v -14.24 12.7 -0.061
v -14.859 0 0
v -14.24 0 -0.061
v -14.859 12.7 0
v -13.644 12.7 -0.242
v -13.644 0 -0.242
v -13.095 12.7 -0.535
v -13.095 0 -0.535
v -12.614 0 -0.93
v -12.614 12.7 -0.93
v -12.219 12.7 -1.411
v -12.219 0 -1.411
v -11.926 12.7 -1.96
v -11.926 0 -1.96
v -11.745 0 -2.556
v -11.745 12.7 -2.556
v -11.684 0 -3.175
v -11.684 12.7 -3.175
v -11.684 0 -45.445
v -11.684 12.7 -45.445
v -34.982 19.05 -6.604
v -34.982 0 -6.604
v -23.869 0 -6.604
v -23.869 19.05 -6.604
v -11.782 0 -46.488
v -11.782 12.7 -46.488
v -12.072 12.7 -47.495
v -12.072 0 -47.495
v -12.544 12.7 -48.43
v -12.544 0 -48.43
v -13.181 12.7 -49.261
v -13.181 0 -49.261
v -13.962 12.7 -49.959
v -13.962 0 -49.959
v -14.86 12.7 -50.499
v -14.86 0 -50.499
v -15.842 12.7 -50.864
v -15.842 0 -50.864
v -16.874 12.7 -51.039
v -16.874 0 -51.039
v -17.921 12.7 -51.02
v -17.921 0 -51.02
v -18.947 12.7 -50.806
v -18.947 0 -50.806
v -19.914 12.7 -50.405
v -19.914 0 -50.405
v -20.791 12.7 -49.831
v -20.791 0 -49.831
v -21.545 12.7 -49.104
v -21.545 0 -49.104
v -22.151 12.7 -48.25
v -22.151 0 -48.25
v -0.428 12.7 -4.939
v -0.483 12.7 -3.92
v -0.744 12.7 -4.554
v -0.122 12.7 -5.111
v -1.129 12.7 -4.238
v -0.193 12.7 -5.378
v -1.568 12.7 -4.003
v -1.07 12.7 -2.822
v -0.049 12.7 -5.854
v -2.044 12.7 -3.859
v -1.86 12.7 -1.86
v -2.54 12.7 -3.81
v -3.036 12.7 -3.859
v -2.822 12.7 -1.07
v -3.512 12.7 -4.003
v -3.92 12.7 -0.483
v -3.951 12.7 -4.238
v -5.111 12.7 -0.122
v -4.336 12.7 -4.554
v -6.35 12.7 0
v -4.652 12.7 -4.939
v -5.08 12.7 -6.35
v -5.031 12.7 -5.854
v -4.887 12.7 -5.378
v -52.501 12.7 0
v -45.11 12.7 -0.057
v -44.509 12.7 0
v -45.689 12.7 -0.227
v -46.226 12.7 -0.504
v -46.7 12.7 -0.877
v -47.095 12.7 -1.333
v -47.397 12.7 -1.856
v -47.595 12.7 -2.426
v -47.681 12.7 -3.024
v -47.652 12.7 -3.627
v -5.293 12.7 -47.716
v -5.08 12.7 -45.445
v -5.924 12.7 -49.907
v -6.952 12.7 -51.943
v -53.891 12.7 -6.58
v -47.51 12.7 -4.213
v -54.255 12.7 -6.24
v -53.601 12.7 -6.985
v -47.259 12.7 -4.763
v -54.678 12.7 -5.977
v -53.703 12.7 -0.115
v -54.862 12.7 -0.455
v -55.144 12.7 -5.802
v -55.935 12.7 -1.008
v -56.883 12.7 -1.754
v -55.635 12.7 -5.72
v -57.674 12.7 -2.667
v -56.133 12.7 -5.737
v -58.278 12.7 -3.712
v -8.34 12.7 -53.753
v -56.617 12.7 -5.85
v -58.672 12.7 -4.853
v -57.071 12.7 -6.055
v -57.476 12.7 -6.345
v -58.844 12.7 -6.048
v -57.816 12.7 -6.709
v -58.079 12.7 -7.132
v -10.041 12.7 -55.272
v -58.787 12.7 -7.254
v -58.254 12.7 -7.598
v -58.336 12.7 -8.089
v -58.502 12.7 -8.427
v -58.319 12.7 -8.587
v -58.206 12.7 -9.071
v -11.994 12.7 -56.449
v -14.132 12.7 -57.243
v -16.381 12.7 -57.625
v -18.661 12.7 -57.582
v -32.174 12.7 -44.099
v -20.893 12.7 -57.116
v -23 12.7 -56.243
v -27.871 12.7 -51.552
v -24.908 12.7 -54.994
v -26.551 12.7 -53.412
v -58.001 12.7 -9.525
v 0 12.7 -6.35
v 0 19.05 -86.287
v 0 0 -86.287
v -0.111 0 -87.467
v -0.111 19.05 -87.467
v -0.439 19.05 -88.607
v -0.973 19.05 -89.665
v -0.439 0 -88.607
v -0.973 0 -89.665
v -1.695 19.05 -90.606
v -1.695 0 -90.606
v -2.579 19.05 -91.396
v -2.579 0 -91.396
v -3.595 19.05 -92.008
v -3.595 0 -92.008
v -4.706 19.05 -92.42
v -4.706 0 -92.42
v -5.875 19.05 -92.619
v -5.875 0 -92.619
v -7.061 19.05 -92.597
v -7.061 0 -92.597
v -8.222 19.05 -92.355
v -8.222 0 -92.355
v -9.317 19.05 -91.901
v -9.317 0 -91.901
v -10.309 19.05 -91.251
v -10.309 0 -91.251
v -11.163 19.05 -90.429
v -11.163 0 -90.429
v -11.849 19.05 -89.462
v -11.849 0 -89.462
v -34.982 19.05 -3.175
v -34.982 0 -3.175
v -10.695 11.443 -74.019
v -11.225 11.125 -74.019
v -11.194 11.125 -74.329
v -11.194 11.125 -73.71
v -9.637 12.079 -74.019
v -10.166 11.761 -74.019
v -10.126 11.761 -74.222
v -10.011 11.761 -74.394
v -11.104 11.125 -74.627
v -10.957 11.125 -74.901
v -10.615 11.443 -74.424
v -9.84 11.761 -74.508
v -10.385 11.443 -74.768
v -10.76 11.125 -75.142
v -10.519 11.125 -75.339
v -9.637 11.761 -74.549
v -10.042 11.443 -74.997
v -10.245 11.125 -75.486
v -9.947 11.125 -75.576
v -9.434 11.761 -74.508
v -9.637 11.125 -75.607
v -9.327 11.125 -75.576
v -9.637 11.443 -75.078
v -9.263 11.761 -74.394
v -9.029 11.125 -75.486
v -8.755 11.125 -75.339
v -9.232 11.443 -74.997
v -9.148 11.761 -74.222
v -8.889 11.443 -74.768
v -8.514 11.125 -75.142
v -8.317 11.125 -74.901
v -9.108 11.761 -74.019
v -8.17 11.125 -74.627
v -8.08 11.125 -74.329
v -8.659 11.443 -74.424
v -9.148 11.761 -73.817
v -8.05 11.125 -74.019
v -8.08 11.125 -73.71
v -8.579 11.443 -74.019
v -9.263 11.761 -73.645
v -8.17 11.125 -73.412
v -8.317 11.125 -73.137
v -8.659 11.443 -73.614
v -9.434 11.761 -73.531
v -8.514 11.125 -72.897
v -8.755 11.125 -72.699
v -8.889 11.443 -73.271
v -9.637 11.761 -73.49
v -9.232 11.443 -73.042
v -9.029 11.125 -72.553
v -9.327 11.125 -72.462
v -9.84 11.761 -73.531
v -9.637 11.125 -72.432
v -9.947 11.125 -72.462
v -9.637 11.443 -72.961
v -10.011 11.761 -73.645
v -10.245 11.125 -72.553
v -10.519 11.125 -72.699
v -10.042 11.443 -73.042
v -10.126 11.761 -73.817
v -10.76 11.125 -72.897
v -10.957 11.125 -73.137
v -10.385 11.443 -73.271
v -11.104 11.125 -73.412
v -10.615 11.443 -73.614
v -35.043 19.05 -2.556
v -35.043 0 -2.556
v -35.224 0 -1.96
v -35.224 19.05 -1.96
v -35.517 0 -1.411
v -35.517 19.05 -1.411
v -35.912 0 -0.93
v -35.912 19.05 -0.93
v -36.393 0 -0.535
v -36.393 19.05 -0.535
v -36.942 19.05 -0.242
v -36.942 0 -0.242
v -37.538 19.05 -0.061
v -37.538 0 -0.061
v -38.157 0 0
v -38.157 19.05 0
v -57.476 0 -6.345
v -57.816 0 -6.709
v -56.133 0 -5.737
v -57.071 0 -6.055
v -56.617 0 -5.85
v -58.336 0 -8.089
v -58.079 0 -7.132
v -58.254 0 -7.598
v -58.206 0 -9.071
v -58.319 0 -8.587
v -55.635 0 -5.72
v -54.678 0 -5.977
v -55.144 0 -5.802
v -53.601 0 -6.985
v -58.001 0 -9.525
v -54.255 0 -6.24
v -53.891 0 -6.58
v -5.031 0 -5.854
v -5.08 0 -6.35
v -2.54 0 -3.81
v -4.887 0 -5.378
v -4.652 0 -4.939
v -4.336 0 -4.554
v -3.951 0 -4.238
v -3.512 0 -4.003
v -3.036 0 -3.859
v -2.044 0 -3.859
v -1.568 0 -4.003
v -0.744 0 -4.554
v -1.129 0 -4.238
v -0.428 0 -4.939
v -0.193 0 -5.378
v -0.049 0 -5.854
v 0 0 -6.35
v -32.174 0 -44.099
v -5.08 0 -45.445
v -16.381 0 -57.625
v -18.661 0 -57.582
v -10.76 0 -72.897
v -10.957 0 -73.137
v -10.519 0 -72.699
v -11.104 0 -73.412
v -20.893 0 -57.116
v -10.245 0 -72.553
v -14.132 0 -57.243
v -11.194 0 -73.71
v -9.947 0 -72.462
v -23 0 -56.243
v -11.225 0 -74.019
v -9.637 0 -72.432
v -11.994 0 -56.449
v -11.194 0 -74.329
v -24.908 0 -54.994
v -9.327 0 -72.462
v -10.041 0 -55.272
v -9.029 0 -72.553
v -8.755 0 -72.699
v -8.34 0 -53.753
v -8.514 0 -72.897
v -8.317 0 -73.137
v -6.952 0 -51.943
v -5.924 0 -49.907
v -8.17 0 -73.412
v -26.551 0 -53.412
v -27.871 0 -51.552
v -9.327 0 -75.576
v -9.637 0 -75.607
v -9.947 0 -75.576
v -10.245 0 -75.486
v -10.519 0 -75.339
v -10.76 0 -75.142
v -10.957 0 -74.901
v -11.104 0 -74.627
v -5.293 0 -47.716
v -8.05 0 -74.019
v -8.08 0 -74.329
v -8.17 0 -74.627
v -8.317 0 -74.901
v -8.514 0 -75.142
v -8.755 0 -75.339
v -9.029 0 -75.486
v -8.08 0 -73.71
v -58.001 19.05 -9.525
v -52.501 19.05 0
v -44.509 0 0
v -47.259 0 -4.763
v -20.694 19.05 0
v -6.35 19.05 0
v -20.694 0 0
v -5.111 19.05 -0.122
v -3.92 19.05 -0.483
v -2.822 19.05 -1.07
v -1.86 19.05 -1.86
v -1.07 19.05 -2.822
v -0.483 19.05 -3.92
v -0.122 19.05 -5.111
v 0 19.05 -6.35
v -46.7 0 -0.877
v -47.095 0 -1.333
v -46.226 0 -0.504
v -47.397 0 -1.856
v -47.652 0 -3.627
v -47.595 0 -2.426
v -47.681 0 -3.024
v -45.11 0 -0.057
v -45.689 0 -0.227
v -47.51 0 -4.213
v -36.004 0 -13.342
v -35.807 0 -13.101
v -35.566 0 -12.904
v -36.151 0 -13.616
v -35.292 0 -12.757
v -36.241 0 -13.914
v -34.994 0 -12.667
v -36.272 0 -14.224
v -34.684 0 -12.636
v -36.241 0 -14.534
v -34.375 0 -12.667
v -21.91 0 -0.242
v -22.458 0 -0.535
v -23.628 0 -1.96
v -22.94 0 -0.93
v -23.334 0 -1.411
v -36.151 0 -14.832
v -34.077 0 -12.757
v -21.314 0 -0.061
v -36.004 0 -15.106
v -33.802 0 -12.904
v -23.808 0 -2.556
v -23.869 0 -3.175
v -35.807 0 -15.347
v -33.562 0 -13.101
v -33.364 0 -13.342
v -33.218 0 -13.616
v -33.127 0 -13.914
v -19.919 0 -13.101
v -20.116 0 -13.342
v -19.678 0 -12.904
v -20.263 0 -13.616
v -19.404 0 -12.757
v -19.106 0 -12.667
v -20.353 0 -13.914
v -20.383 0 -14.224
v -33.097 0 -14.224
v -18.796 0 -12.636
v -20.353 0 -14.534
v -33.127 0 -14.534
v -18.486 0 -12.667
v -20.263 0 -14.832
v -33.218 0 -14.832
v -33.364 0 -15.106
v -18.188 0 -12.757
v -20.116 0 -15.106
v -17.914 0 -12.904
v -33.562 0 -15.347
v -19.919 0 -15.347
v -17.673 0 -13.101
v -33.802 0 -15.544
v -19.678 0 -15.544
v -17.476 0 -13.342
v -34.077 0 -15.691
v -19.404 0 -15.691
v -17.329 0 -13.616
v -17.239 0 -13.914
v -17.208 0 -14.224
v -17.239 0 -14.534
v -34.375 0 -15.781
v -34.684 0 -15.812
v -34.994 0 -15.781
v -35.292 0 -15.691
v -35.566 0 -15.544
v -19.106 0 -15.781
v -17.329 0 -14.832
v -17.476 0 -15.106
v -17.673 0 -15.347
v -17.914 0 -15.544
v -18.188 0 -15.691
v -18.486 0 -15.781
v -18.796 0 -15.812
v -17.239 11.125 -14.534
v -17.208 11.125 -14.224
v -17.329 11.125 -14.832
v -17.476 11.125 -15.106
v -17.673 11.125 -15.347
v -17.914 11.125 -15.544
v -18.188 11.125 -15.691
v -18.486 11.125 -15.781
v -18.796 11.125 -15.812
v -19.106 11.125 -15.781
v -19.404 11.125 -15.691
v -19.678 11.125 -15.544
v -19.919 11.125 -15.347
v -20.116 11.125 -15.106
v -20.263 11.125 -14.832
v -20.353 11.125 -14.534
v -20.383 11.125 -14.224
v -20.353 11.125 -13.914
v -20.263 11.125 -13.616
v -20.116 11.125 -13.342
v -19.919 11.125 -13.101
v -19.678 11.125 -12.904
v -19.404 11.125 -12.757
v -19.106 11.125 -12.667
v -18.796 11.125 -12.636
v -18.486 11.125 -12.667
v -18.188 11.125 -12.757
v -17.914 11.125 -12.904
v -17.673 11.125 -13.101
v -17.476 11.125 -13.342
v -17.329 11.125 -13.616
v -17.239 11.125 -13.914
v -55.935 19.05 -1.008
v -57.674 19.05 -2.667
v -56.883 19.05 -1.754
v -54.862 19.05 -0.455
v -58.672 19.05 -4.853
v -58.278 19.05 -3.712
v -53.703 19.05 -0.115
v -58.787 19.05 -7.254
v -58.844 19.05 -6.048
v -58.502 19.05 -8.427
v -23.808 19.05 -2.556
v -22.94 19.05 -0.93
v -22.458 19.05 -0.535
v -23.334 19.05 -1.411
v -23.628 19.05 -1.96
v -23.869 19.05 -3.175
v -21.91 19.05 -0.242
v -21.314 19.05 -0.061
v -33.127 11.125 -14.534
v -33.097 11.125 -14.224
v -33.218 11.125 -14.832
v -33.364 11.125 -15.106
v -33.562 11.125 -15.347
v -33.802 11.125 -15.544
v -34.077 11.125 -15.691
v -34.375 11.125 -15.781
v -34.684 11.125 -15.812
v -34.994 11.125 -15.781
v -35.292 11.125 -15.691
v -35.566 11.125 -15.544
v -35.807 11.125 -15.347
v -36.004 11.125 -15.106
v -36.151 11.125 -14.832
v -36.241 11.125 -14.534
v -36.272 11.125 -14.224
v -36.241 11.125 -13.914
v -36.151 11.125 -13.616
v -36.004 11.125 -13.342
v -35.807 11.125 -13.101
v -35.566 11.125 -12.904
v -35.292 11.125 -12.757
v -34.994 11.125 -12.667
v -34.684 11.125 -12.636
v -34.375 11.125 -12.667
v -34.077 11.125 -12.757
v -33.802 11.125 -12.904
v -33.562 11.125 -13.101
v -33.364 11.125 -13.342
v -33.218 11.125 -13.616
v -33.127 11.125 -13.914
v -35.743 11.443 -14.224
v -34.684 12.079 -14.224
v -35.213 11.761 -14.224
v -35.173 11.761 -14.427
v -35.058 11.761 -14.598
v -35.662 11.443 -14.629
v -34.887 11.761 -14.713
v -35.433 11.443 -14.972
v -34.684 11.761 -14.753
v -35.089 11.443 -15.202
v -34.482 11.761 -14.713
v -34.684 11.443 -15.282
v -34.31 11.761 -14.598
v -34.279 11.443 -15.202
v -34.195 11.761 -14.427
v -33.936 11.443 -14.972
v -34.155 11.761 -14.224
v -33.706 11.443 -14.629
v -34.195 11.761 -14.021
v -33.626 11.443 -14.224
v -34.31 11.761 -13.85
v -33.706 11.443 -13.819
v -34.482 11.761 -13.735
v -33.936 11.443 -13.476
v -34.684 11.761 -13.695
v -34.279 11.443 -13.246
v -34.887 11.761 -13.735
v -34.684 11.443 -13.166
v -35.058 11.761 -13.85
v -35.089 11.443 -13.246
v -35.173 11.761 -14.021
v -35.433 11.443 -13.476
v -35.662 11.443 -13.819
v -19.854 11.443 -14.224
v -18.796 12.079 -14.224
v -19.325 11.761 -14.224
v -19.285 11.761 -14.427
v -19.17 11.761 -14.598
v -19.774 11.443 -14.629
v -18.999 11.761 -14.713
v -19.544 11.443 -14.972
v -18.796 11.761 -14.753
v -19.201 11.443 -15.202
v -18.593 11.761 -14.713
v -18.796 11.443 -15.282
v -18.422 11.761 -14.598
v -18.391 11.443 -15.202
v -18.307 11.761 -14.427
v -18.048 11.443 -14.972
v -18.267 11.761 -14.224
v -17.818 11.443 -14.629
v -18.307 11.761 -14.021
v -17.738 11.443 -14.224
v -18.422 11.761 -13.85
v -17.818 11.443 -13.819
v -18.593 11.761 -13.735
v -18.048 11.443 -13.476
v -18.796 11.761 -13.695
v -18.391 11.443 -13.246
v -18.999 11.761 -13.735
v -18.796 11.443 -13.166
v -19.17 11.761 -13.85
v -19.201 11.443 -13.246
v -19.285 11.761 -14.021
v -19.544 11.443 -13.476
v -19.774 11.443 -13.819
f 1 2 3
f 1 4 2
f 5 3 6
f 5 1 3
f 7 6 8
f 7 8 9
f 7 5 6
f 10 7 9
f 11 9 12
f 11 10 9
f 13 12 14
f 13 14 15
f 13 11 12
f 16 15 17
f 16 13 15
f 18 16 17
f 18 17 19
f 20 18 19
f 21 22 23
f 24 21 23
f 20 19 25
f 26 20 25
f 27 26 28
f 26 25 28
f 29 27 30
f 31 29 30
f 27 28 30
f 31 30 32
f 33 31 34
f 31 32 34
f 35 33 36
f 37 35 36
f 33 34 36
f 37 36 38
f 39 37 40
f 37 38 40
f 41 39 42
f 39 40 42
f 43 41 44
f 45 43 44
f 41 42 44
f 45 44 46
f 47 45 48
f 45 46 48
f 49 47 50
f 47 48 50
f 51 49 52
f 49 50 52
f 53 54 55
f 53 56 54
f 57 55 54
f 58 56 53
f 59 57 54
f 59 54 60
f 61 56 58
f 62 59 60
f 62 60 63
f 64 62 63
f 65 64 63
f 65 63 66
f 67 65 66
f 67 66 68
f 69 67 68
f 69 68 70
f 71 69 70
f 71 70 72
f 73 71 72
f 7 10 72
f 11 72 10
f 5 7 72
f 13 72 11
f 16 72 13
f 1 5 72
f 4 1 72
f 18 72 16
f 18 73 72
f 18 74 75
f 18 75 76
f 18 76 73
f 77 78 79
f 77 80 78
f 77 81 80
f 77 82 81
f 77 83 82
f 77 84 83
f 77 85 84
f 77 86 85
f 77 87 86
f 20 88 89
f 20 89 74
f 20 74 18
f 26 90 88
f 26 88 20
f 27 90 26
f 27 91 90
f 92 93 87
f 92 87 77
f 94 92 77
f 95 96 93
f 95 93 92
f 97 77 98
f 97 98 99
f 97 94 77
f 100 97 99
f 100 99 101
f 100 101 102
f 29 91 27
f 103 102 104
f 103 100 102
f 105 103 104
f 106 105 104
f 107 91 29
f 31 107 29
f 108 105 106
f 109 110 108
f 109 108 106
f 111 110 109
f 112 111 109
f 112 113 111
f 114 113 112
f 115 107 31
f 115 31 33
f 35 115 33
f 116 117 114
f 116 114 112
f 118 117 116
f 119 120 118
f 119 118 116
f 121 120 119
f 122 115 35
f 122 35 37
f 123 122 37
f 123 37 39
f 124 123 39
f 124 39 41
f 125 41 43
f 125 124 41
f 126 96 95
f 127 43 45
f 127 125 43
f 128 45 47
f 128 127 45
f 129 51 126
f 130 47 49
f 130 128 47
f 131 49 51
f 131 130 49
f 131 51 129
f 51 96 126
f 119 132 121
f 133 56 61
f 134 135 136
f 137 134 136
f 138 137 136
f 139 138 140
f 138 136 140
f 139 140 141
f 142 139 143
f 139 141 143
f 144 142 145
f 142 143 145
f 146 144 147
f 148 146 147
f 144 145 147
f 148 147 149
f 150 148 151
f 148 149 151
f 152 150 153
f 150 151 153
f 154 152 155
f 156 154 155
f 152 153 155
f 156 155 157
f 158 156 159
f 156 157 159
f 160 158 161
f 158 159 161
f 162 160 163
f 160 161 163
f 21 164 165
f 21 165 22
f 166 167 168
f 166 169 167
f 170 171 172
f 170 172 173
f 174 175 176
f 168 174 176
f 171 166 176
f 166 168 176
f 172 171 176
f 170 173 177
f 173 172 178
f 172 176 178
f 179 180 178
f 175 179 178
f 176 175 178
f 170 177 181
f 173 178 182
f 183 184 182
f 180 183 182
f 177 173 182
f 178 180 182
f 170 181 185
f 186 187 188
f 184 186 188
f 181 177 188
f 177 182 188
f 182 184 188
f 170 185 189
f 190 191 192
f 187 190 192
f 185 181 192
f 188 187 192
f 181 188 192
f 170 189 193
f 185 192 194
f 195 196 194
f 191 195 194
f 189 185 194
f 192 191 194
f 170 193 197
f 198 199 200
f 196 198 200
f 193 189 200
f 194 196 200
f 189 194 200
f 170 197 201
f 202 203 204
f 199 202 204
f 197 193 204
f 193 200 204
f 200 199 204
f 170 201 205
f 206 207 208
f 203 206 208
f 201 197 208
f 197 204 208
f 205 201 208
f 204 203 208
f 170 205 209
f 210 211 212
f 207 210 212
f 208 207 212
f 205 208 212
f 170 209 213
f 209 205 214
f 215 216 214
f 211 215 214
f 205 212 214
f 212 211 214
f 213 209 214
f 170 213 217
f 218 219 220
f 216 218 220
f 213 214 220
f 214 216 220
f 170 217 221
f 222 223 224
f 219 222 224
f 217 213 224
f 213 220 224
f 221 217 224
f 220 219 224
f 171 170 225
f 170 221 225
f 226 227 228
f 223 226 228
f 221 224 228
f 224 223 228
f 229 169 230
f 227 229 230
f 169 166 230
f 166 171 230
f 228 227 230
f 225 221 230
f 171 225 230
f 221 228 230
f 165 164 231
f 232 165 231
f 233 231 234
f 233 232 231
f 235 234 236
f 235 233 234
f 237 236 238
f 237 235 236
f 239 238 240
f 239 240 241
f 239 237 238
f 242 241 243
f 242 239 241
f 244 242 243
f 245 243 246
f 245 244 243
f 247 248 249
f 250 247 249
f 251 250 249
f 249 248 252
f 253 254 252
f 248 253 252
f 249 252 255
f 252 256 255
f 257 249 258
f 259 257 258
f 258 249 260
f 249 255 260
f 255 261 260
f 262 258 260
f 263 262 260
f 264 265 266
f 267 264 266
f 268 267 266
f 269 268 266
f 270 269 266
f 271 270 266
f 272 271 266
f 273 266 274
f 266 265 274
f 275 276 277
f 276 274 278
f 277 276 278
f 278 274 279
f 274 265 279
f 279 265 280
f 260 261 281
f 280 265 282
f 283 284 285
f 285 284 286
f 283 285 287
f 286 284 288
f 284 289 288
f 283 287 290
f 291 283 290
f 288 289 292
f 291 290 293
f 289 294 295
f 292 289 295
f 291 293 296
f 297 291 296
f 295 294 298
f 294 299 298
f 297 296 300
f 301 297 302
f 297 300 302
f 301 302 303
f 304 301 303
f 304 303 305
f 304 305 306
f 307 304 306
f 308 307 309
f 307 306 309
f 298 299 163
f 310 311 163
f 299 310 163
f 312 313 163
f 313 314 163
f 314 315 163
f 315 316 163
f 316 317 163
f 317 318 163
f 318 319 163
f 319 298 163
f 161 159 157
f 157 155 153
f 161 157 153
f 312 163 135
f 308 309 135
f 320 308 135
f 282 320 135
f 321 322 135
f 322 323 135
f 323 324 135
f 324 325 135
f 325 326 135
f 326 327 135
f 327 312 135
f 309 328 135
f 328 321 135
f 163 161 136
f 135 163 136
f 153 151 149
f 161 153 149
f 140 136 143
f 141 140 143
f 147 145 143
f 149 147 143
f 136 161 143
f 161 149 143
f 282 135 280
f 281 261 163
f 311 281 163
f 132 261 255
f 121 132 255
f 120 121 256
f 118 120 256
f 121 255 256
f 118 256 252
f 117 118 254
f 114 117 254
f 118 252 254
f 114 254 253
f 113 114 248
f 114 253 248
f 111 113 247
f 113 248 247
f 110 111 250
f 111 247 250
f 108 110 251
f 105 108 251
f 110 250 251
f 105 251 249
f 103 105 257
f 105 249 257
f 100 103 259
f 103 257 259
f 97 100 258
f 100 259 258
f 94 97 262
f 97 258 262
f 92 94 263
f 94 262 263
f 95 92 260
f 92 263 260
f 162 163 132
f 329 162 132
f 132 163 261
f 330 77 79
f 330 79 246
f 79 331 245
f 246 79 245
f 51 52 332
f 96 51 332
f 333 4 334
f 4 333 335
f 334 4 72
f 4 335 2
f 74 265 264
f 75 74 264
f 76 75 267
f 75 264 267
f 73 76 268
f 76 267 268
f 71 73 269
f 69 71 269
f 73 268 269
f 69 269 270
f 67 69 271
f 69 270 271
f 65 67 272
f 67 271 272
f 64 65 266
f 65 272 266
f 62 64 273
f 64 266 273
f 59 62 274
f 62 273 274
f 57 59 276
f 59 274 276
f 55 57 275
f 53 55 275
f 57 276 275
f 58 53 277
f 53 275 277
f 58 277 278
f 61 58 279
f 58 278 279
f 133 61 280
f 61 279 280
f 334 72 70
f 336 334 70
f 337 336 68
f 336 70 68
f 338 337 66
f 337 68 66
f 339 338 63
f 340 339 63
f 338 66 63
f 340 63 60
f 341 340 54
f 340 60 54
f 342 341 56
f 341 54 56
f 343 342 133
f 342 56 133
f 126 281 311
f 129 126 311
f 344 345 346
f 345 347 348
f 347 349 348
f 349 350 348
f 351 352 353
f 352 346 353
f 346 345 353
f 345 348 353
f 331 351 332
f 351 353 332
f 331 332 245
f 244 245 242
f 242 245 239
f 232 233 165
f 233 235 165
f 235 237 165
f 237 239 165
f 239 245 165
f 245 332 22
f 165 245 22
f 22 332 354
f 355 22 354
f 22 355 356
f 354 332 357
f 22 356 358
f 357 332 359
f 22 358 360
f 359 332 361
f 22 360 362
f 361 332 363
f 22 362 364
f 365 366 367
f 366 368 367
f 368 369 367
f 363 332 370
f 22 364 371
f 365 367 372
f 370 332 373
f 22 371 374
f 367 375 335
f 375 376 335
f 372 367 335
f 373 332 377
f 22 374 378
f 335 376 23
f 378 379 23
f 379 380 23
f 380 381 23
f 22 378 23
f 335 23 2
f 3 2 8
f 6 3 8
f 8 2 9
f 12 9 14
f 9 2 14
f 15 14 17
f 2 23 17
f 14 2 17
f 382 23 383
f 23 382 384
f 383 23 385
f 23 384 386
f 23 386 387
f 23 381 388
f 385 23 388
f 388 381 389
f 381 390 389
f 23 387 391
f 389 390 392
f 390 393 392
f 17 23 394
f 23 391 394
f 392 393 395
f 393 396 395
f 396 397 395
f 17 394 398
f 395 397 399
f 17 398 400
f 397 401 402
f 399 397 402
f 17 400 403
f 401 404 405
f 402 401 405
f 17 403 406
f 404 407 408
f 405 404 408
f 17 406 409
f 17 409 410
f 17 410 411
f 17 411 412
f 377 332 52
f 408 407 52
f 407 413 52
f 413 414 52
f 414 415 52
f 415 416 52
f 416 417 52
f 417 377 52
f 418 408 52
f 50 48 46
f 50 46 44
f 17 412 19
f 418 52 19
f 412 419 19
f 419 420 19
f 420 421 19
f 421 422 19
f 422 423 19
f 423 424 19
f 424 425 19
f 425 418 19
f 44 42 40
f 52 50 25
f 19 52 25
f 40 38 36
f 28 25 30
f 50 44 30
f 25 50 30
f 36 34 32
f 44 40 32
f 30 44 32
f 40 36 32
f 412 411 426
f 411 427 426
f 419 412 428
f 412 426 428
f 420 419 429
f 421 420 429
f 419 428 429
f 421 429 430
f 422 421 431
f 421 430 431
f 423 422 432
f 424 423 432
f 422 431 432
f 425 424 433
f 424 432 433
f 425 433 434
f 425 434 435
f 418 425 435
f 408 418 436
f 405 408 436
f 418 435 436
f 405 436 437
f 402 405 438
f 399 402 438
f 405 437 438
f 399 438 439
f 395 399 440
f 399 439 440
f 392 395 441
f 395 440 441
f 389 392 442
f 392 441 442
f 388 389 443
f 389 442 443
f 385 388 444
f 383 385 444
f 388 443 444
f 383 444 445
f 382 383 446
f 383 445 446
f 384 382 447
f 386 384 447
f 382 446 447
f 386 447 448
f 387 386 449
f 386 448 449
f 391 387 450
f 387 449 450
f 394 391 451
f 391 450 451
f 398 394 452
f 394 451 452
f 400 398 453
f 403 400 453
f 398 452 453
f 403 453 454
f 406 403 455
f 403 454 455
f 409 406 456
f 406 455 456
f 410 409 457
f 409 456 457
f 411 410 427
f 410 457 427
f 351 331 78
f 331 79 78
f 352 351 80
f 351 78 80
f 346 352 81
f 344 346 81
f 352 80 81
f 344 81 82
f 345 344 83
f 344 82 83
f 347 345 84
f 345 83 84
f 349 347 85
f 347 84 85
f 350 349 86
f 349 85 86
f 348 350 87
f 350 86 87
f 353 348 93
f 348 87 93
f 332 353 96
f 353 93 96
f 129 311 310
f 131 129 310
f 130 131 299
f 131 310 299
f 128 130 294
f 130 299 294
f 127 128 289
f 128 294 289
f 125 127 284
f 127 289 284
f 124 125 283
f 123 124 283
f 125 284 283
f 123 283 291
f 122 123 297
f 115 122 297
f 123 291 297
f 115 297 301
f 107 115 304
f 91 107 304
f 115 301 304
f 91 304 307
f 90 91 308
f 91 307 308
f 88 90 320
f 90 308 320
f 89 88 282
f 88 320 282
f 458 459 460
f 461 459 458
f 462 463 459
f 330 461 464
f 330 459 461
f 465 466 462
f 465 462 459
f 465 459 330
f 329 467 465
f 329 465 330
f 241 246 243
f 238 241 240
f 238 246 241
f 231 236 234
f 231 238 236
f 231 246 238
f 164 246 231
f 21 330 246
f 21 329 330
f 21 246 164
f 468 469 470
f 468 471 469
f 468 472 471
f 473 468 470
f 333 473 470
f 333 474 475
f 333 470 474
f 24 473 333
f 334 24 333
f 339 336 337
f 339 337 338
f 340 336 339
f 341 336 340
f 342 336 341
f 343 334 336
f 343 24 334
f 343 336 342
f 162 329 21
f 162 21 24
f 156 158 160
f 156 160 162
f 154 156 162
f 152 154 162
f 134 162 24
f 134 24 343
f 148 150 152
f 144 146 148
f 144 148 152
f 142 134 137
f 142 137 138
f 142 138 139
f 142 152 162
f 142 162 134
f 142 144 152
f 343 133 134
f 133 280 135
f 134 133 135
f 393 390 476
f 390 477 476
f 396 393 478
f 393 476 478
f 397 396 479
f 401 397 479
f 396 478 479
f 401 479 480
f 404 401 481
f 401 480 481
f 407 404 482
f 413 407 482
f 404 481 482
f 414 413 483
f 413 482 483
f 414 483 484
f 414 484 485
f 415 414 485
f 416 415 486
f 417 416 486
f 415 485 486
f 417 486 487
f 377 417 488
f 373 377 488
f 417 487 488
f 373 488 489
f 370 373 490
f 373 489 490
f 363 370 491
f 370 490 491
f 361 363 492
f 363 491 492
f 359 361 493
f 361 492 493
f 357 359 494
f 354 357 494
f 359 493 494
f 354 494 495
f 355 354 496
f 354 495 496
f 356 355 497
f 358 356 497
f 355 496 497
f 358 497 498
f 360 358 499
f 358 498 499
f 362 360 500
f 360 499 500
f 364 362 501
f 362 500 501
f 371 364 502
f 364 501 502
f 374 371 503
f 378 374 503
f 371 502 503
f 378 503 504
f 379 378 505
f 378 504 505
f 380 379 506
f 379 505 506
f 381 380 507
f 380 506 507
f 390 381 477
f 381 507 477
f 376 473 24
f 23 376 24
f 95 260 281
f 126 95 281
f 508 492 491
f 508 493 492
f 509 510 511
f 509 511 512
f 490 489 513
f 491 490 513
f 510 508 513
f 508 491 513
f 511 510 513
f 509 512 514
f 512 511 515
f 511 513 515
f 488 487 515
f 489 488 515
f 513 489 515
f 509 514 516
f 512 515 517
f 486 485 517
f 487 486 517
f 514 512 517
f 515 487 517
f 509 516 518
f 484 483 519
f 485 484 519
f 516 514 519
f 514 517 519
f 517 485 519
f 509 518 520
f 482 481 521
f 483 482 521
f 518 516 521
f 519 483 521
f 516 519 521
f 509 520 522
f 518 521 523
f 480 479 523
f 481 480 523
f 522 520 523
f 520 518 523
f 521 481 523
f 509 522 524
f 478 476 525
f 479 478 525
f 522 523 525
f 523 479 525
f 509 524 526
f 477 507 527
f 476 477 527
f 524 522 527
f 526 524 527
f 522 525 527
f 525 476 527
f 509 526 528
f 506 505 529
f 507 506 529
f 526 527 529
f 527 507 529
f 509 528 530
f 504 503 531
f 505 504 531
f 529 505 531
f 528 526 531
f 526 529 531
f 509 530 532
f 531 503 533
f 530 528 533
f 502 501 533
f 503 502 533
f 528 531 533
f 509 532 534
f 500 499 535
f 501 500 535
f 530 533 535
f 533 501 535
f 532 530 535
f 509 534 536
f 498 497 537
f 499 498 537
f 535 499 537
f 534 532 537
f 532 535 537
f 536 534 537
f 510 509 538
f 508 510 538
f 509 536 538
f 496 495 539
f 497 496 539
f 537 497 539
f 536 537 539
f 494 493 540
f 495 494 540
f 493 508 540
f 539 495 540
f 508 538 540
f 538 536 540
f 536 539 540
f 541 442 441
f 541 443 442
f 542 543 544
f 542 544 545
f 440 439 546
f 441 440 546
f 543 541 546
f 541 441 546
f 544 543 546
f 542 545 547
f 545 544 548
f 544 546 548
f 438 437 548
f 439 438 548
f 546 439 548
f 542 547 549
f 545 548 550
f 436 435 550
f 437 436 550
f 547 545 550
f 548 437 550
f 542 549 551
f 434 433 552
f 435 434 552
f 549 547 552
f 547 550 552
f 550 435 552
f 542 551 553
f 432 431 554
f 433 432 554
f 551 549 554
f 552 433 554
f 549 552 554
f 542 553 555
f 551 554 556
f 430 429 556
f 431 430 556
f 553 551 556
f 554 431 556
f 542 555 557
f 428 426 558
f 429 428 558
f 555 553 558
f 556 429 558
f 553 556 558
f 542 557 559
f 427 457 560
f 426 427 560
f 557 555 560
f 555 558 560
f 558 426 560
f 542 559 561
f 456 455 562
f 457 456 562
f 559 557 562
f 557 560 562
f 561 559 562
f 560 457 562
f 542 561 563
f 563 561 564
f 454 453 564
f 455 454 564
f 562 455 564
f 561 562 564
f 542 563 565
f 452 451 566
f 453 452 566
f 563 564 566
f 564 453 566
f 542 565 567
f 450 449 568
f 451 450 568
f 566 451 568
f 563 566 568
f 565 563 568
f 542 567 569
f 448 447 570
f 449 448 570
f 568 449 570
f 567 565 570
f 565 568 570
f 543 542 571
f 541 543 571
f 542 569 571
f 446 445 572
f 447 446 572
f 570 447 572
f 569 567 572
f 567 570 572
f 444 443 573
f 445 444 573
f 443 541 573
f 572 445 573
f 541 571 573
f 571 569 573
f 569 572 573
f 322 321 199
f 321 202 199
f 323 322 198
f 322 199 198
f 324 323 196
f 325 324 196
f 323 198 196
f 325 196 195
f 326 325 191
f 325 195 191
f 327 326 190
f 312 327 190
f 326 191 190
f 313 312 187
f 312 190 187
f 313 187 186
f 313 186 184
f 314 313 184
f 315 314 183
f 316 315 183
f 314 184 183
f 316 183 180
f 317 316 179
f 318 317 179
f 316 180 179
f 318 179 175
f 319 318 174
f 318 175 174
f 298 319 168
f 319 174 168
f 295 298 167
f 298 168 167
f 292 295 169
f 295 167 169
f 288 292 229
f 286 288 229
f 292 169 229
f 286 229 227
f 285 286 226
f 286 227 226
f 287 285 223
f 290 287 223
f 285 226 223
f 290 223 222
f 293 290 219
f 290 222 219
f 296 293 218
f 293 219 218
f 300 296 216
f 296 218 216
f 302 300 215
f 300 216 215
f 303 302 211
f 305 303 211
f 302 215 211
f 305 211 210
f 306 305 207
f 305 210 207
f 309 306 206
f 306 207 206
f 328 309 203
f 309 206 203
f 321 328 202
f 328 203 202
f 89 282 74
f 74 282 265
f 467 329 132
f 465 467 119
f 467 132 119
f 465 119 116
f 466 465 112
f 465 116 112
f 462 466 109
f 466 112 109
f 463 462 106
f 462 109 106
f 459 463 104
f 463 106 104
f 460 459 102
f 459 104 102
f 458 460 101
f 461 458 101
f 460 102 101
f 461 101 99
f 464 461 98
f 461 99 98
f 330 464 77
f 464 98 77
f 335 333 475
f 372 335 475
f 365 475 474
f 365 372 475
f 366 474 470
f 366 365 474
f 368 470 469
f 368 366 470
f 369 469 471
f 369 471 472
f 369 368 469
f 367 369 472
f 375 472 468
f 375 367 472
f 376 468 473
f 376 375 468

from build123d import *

# Parameters (mm, degrees)
BOSS_EXTRUDE1_DEPTH              = 19.05
SKETCH2_W                        = 11.1125
SKETCH2_H                        = 6.604
CUT_EXTRUDE1_DEPTH               = 112.391012889
CUT_EXTRUDE2_DEPTH               = 12.7
FILLET1_R                        = 3.175
F_1_8_0_125_DIAMETER_HOLE1_D     = 3.175
F_1_8_0_125_DIAMETER_HOLE1_DEPTH = 11.1252
F_1_8_0_125_DIAMETER_HOLE1_TIP   = 0.953866233


with BuildPart() as part:
    # Sketch1 → Boss-Extrude1 (new body)
    with BuildSketch(Plane(origin=(0, 0, 0), x_dir=(1, 0, 0), z_dir=(0, 1, 0))):
        with BuildLine():
            Line((0, 6.35), (0, 86.286703653))
            ThreePointArc((0, 86.286703653), (-4.706499064, 92.420332649), (-11.849261314, 89.461703653))
            Line((-11.849261314, 89.461703653), (-58.000738686, 9.525))
            ThreePointArc((-58.000738686, 9.525), (-58.000738686, 3.175), (-52.501477372, 0))
            Line((-52.501477372, 0), (-6.35, 0))
            ThreePointArc((-6.35, 0), (-1.859871939, 1.859871939), (0, 6.35))
        make_face()
    extrude(amount=BOSS_EXTRUDE1_DEPTH)

    # Sketch2 → Cut-Extrude1 (cut, through all)
    with BuildSketch(Plane(origin=(0, 19.05, 0), x_dir=(1, 0, 0), z_dir=(0, 1, 0))):
        with Locations((-29.425738686, 3.302)):
            Rectangle(SKETCH2_W, SKETCH2_H)
    extrude(amount=-CUT_EXTRUDE1_DEPTH, mode=Mode.SUBTRACT)

    # Sketch3 → Cut-Extrude2 (cut)
    with BuildSketch(Plane(origin=(0, 0, 0), x_dir=(1, 0, 0), z_dir=(0, 1, 0))):
        with BuildLine():
            Line((-22.151280202, 48.250083518), (-50.00847891, 0))
            Line((-50.00847891, 0), (-52.501477372, 0))
            ThreePointArc((-52.501477372, 0), (-58.000738686, 3.175), (-58.000738686, 9.525))
            ThreePointArc((-58.000738686, 9.525), (-57.07103416, 6.055295474), (-53.601329635, 6.985))
            Line((-53.601329635, 6.985), (-32.17376215, 44.098635567))
            Line((-32.17376215, 44.098635567), (-27.870511969, 51.552083518))
            ThreePointArc((-27.870511969, 51.552083518), (-14.132338403, 57.242621331), (-5.08, 45.445384241))
            Line((-5.08, 45.445384241), (-5.08, 36.838883879))
            Line((-5.08, 36.838883879), (-5.08, 6.35))
            ThreePointArc((-5.08, 6.35), (-2.54, 3.81), (0, 6.35))
            ThreePointArc((0, 6.35), (-1.859871939, 1.859871939), (-6.35, 0))
            Line((-6.35, 0), (-11.684, 0))
            Line((-11.684, 0), (-11.684, 45.445384241))
            ThreePointArc((-11.684, 45.445384241), (-15.841579377, 50.863647174), (-22.151280202, 48.250083518))
        make_face()
    extrude(amount=CUT_EXTRUDE2_DEPTH, mode=Mode.SUBTRACT)

    # Fillet1
    fillet1_edges = [part.edges().sort_by_distance(p)[0] for p in [
        (-34.981988686, 9.525, 0),
        (-23.869488686, 9.525, 0),
        (-50.00847891, 6.35, 0),
        (-11.684, 6.35, 0),
    ]]
    fillet(fillet1_edges, radius=FILLET1_R)

    # 1/8 (0.125) Diameter Hole1
    with Locations(Plane(origin=(0, 0, 0), x_dir=(-1, 0, 0), z_dir=(0, -1, 0))):
        with Locations((9.637001873, 74.019445659), (18.796, 14.224), (34.684248681, 14.224)):
            Hole(F_1_8_0_125_DIAMETER_HOLE1_D / 2, depth=F_1_8_0_125_DIAMETER_HOLE1_DEPTH)
            with Locations((0, 0, -(F_1_8_0_125_DIAMETER_HOLE1_DEPTH + F_1_8_0_125_DIAMETER_HOLE1_TIP / 2))):  # 118° drill point
                Cone(0, F_1_8_0_125_DIAMETER_HOLE1_D / 2, F_1_8_0_125_DIAMETER_HOLE1_TIP, mode=Mode.SUBTRACT)


solid = part.part
